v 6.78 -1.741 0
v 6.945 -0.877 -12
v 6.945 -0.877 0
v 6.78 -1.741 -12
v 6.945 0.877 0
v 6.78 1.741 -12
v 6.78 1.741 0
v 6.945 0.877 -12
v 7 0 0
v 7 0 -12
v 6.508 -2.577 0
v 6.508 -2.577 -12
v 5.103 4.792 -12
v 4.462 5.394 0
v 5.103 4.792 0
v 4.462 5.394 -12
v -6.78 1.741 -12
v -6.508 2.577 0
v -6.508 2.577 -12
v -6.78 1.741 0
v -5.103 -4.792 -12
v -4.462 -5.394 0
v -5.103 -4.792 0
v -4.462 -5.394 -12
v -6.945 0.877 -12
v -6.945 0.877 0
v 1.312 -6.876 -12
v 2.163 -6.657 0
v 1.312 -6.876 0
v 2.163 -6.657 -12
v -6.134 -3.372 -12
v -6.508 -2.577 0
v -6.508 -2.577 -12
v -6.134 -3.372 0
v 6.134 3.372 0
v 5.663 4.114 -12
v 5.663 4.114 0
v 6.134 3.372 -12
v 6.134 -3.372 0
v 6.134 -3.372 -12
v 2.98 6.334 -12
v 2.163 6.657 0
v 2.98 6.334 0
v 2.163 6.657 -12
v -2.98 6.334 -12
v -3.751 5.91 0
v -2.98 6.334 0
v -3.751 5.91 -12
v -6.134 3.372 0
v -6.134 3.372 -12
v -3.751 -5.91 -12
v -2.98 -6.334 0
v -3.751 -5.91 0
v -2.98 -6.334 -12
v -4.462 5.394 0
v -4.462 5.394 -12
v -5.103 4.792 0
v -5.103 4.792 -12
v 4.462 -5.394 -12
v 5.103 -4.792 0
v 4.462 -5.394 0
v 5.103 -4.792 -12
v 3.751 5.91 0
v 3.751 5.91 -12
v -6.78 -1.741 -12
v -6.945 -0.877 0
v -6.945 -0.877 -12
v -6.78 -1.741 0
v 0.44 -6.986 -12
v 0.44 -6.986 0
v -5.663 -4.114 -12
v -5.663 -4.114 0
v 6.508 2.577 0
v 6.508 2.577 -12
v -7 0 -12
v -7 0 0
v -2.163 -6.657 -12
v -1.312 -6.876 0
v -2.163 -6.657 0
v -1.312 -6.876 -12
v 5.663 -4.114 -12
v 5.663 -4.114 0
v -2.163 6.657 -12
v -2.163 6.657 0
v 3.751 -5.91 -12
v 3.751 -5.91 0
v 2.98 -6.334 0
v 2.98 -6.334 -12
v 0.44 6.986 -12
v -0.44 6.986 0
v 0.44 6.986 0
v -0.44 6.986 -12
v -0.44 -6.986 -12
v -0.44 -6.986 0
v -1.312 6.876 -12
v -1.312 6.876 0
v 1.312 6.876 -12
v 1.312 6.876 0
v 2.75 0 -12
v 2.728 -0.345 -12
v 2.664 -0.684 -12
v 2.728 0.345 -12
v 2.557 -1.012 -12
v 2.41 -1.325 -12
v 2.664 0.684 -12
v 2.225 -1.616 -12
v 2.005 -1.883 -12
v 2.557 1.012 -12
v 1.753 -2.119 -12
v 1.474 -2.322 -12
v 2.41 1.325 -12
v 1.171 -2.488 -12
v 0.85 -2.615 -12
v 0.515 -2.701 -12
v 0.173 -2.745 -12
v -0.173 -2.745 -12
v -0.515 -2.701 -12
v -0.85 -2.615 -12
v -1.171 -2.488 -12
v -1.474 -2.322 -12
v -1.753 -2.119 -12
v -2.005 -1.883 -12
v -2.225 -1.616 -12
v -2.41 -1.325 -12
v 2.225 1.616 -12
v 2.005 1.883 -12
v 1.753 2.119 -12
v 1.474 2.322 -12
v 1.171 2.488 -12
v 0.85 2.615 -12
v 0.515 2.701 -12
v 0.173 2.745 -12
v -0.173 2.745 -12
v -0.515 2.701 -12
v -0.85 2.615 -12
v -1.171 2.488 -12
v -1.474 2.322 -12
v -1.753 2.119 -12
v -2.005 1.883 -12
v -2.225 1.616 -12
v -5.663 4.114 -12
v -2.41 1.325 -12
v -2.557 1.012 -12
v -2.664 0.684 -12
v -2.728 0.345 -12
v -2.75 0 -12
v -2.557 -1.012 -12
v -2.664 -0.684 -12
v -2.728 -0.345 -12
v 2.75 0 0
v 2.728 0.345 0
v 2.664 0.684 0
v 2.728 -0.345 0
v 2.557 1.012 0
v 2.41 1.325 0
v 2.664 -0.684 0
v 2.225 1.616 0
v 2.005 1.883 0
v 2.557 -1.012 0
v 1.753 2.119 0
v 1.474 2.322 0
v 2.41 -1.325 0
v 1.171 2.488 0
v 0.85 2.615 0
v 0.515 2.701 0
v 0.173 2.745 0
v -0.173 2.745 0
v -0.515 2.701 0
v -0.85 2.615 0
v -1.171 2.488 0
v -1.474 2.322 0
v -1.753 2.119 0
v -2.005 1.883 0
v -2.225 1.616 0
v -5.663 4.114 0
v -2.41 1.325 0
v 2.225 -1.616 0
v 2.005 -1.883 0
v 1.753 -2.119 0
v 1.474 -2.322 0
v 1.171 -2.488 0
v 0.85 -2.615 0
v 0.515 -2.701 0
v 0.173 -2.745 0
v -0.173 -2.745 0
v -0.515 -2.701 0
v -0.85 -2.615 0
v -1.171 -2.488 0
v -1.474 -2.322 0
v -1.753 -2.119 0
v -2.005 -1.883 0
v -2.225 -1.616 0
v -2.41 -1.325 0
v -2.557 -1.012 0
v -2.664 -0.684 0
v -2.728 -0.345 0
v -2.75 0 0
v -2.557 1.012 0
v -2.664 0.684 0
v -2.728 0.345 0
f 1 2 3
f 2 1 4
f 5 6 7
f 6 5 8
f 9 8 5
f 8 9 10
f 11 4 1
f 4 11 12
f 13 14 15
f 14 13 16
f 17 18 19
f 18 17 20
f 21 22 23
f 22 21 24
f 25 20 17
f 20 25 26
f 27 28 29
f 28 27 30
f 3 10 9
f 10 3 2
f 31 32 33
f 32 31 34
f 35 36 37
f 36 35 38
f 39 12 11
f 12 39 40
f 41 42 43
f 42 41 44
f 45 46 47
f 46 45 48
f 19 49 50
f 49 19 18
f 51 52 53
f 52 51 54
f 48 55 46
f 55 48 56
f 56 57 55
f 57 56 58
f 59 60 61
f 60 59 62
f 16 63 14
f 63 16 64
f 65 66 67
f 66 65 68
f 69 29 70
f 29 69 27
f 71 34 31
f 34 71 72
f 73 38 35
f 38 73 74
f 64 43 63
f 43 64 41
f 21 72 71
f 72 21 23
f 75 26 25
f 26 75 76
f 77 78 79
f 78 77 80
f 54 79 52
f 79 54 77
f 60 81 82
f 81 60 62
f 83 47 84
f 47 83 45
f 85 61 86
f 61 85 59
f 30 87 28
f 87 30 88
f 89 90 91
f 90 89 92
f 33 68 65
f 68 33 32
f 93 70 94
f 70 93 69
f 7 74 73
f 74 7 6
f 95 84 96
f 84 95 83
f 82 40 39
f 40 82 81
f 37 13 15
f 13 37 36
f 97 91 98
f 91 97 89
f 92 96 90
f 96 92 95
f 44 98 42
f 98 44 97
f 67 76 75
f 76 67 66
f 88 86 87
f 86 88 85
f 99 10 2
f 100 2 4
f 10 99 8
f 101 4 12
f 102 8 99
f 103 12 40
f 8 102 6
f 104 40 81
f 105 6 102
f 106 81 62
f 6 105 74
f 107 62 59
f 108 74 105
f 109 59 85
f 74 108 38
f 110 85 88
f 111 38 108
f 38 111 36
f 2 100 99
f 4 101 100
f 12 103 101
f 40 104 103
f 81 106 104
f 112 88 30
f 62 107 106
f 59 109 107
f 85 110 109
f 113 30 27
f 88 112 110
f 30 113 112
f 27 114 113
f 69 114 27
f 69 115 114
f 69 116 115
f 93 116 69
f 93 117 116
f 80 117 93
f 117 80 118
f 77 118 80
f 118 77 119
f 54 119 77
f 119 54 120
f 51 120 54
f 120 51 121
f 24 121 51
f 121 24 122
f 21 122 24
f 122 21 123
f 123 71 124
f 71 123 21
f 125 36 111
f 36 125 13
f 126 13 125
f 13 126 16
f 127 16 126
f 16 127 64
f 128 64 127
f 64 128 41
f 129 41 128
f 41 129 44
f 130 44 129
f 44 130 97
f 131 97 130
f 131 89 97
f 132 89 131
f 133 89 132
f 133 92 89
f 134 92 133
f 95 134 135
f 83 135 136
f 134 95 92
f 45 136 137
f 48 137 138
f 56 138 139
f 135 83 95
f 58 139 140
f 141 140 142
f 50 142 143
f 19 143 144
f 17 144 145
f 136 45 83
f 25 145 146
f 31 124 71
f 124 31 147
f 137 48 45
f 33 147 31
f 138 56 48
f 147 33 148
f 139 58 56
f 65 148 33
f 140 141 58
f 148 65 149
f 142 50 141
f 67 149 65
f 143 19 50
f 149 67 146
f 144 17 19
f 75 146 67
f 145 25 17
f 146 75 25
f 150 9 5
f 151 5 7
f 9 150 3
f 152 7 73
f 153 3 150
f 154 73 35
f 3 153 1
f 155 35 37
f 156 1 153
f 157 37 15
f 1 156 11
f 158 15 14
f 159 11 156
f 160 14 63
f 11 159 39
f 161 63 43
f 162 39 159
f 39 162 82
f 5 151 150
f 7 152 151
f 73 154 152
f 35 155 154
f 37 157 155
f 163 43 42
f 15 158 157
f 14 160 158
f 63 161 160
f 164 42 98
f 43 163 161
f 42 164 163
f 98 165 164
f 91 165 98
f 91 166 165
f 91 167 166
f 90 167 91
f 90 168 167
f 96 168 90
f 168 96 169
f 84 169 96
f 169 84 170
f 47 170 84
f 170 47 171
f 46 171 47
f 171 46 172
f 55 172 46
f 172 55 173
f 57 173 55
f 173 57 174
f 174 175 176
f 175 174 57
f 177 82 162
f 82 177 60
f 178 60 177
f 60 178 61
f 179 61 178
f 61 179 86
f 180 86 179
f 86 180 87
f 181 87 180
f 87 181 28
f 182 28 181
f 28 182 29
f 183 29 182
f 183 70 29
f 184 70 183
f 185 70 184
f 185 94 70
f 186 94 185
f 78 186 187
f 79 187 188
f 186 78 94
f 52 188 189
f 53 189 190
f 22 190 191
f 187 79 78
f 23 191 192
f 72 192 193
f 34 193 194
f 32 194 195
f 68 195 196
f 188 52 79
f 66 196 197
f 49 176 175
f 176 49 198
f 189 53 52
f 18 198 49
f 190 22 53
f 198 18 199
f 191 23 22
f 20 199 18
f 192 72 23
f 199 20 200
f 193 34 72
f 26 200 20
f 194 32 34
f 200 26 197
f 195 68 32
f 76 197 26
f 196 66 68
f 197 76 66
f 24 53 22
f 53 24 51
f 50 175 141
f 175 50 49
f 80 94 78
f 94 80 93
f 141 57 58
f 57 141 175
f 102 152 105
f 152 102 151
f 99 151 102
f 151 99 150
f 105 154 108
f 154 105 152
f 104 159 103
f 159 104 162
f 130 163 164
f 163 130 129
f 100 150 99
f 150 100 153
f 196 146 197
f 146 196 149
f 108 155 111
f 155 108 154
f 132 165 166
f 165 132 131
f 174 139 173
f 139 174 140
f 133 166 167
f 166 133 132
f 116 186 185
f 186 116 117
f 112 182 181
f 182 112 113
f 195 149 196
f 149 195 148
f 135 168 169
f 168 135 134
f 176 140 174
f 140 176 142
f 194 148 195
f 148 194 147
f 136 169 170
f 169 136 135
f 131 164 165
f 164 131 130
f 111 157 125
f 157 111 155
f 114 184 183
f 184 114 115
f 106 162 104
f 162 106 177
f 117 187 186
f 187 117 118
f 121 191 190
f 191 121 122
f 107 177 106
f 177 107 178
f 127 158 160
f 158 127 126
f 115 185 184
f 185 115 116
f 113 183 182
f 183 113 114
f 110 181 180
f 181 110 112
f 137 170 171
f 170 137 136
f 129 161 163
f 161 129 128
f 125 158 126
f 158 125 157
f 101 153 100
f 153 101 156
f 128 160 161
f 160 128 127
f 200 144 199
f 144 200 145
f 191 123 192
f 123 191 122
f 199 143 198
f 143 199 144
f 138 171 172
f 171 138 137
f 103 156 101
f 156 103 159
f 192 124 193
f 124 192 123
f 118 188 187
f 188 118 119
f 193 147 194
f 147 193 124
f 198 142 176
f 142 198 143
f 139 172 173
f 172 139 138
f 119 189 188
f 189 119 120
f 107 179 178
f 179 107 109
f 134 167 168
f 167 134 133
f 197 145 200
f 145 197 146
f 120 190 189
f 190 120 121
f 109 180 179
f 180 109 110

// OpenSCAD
$fn = 50;


difference() {
	union() {
		translate(v = [0, 0, -12.0000000000]) {
			cylinder(h = 12, r = 7.0000000000);
		}
		cylinder(h = 0, r = 13.0000000000);
	}
	union() {
		#translate(v = [0, 0, -12]) {
			cylinder(h = 12, r = 2.7500000000);
		}
	}
}
